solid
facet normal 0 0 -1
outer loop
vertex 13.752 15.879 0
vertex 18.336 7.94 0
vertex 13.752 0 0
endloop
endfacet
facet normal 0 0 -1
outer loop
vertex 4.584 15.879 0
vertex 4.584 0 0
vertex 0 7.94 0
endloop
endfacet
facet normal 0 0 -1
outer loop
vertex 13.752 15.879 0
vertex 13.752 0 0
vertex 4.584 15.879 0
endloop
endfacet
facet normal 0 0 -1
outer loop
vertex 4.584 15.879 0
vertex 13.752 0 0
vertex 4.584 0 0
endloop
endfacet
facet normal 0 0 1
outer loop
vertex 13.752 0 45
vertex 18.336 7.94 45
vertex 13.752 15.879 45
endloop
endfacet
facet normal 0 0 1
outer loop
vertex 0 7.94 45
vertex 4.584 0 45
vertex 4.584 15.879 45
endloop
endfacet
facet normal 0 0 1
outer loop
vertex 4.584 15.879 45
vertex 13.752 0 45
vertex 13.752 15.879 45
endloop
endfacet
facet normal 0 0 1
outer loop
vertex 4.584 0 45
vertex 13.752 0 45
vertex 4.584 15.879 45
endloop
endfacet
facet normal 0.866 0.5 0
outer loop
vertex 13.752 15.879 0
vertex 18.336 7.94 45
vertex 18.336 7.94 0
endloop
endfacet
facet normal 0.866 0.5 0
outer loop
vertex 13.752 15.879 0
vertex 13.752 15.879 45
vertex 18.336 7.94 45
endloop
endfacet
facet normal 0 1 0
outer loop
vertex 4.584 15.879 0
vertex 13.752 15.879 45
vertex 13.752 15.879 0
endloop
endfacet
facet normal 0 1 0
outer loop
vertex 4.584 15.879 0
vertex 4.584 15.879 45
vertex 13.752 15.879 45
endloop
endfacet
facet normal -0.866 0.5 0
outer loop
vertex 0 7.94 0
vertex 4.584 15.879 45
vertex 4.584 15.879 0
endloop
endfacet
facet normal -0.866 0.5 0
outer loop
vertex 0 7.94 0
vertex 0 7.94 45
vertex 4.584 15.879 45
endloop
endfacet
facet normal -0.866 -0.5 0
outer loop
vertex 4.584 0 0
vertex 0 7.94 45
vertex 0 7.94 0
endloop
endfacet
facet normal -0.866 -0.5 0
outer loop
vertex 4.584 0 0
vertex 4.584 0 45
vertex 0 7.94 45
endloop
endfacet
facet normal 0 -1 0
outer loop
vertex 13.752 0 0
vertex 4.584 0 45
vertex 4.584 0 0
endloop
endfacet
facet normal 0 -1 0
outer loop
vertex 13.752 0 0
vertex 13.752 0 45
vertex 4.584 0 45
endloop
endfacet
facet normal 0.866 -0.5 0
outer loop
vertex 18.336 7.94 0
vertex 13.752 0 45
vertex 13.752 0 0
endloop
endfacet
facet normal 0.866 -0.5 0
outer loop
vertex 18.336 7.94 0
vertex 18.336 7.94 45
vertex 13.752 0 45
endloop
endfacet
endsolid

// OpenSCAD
$fn = 32;

// ----------------------------------------------------------------------
// Key bar: hex key, 45 mm thick
// ----------------------------------------------------------------------

// --- parameters (mm) ---
profile_height = 45;      // extrusion height
profile_points = 6;       // points of the closed outline

profile = [[18.336, 7.94], [13.752, 15.879], [4.584, 15.879], [0, 7.94], [4.584, 0], [13.752, 0]];  // single closed polygon, 6 points, counter clockwise

// --- the one profile operation ---
linear_extrude(height = profile_height) polygon(points = profile);
